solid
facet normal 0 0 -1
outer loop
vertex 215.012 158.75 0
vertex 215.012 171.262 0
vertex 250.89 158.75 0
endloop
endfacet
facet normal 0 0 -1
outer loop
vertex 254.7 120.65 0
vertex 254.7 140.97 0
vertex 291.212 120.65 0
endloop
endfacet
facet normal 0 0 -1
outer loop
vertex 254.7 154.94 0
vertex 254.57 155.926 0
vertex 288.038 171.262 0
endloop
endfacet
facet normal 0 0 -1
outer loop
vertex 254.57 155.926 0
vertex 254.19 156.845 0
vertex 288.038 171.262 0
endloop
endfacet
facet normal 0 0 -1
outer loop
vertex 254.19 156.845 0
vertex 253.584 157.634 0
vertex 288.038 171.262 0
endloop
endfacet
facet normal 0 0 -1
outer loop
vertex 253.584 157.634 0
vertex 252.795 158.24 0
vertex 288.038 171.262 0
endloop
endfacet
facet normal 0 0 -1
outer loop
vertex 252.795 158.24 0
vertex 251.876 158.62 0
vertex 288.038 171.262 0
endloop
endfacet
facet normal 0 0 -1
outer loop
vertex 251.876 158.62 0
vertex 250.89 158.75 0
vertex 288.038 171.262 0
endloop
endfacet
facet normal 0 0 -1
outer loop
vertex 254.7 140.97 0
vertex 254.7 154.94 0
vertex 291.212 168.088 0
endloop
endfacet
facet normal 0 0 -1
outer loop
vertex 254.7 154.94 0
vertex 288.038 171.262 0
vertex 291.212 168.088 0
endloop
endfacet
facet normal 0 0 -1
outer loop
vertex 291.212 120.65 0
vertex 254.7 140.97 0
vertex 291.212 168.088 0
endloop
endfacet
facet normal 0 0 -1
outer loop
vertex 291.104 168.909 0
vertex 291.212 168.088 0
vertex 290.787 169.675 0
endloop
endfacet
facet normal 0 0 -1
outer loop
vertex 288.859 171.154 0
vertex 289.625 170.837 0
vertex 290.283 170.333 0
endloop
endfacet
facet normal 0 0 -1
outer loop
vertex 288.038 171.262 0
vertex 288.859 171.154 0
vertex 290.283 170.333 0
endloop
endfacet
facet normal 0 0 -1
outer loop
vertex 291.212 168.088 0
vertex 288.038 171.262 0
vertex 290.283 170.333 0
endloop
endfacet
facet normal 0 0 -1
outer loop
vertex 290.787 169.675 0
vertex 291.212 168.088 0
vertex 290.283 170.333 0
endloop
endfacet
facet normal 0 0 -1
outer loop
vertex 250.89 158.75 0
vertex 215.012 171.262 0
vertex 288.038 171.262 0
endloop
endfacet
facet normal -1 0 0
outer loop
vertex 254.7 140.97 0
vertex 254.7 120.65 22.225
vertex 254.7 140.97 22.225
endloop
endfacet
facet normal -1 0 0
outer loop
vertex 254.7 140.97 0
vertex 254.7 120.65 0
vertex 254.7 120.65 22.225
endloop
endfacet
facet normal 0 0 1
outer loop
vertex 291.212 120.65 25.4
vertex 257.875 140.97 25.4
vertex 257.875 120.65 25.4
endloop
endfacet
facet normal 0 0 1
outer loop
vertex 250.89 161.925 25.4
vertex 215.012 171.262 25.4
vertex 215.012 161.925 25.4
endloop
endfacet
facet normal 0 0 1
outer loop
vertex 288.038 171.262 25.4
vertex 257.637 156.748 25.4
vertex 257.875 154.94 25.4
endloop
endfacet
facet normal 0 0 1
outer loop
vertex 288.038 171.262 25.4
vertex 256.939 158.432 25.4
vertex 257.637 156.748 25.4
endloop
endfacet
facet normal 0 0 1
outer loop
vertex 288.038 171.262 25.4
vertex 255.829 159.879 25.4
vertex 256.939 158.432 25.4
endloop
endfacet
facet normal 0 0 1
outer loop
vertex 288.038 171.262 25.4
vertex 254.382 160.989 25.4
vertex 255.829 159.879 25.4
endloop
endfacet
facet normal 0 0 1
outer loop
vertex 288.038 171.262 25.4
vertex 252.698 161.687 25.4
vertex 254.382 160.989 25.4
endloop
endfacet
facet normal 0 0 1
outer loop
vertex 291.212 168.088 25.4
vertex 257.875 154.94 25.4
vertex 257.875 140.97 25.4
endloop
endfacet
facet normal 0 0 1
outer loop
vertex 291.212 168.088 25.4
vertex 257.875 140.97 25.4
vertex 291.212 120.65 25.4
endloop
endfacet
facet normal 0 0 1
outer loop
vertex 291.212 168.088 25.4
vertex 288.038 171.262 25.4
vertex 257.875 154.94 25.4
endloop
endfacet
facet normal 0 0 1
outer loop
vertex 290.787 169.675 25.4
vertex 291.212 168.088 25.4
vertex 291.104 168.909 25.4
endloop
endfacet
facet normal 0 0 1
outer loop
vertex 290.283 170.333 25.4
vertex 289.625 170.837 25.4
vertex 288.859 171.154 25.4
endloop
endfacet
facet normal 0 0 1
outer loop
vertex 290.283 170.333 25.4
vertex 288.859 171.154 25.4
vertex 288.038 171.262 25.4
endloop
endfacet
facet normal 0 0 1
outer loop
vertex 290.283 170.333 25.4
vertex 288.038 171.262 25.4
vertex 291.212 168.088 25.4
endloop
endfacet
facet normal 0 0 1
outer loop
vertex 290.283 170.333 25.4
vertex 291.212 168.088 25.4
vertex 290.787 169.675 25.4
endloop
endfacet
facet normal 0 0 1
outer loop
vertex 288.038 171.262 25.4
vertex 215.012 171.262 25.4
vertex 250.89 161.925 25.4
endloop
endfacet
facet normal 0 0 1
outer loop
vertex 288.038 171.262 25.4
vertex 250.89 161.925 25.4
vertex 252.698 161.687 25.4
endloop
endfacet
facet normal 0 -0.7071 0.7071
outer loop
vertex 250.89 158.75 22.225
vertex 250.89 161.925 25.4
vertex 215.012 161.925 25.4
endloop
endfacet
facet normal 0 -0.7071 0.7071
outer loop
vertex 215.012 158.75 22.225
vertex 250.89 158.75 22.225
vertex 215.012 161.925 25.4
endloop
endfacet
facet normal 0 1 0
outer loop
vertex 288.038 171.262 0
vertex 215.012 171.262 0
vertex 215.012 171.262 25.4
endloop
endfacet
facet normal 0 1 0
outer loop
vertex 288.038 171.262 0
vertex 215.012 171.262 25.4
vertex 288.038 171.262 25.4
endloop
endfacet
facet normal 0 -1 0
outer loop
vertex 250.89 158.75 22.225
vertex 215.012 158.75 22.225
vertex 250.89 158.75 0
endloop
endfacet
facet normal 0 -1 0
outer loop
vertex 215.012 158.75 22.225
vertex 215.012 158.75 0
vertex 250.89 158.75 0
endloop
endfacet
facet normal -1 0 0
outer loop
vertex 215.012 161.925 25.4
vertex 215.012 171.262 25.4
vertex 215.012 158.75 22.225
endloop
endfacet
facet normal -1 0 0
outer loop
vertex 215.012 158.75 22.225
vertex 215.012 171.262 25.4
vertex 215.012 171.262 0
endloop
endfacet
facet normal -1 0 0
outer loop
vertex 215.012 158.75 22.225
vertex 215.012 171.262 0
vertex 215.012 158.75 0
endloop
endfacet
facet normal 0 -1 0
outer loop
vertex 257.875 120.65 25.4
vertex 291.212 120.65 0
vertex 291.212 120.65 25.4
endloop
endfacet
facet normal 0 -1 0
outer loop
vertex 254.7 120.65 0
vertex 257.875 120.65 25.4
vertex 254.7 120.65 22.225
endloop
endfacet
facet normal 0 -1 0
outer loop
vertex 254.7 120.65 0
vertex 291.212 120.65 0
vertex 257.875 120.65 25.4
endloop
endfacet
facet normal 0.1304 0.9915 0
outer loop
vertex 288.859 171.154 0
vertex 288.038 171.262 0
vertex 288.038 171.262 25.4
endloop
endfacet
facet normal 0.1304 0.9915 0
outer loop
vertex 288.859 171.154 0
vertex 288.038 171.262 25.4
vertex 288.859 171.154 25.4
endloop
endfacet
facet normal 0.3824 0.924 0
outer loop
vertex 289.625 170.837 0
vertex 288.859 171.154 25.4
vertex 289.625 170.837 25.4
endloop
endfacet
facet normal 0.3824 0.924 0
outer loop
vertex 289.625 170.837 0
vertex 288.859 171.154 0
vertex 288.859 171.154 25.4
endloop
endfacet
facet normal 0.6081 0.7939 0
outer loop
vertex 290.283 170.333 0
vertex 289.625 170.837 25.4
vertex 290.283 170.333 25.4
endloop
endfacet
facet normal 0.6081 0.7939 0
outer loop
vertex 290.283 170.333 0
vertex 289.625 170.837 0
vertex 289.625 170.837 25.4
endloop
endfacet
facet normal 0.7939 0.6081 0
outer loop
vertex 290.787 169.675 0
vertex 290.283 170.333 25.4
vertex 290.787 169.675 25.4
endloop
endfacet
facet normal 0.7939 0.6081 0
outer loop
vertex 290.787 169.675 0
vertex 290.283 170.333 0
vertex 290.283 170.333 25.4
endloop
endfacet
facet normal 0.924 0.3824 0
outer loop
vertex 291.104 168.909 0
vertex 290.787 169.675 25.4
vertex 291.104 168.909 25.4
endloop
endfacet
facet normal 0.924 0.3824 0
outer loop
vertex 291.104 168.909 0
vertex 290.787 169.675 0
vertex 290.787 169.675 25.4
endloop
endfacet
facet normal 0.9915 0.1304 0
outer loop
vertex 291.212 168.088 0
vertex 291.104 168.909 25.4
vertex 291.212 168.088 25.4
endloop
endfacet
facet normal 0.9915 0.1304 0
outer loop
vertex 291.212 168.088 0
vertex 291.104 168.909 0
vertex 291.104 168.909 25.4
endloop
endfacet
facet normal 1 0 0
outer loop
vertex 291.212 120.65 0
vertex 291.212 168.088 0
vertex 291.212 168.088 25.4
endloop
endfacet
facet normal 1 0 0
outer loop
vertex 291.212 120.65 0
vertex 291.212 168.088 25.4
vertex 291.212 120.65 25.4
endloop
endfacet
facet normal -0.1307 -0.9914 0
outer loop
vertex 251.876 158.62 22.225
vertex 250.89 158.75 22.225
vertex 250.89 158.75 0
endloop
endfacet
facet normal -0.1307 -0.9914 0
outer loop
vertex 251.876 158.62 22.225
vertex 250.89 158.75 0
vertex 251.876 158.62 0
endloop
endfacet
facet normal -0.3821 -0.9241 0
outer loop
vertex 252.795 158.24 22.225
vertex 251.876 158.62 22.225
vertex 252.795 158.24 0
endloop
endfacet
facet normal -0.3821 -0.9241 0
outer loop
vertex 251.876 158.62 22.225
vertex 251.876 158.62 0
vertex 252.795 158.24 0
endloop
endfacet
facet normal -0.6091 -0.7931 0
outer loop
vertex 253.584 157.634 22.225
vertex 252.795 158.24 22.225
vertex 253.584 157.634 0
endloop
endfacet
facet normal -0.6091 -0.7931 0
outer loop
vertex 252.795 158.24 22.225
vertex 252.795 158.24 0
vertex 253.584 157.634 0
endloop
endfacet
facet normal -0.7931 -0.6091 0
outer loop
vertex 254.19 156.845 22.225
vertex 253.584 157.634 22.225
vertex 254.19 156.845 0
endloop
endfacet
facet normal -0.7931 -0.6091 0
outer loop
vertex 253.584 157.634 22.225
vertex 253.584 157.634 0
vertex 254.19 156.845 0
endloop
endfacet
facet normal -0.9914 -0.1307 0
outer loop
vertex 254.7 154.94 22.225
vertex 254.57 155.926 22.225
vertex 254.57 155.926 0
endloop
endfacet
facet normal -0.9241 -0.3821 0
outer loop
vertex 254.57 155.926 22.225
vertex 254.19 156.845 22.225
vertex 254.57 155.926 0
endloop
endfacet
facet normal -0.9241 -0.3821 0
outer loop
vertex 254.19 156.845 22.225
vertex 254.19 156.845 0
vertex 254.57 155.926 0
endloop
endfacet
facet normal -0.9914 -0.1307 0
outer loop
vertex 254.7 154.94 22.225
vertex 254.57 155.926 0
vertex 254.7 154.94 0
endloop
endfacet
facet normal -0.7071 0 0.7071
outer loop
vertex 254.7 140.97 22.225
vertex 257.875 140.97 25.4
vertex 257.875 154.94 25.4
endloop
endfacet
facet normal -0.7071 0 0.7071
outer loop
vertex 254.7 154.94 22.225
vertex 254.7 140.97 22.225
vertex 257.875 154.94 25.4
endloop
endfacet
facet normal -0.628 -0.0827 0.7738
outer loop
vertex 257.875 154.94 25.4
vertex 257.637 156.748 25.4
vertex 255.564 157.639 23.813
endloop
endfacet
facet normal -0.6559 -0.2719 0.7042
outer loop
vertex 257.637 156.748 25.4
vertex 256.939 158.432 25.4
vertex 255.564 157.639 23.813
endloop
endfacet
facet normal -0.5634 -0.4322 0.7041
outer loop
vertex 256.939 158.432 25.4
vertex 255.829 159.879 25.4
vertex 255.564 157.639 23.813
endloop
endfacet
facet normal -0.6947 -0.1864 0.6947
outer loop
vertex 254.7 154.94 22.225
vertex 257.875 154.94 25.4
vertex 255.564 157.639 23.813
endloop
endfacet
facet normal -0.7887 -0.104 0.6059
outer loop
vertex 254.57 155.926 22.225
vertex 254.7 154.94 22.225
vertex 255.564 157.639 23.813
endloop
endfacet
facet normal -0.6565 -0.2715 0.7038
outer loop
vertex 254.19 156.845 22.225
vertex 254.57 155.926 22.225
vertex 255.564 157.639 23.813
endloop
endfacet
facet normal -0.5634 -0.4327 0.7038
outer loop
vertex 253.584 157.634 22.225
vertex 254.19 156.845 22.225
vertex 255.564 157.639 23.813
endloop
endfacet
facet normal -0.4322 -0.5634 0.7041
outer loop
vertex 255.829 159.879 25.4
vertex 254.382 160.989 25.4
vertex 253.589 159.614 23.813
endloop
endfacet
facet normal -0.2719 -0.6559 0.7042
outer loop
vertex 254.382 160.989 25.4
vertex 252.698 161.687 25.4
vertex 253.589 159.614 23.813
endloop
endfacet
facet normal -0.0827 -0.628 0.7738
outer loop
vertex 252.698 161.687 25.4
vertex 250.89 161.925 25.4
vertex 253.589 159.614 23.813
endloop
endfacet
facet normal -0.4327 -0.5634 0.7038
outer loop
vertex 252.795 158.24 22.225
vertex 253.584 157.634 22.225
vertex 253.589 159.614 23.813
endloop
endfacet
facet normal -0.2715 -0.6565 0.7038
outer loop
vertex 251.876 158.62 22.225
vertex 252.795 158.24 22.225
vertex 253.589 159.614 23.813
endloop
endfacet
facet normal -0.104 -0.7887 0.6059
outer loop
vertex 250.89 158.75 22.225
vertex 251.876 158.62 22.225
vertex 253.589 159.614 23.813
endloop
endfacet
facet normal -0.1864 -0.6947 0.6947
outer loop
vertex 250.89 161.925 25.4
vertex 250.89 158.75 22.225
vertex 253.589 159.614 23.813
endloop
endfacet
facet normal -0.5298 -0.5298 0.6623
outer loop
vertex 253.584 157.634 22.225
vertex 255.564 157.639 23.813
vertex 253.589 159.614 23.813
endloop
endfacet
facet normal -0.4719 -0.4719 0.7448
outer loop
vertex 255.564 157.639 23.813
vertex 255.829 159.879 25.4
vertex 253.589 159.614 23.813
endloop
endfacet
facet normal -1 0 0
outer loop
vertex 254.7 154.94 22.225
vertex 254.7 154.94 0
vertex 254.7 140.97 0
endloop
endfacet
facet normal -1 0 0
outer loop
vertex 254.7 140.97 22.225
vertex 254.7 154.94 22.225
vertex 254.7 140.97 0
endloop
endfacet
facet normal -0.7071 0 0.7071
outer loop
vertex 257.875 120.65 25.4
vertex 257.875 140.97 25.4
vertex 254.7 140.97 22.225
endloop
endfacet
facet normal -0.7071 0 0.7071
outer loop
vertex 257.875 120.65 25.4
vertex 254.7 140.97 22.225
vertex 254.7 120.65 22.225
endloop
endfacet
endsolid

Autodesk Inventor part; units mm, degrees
ref_plane "YZ Plane" through (0, 0, 0) normal (1, 0, 0) x (0, 1, 0)
ref_plane "XZ Plane" through (0, 0, 0) normal (0, 1, 0) x (-1, 0, 0)
ref_plane "XY Plane" through (0, 0, 0) normal (0, 0, 1) x (1, 0, 0)
ref_plane "Work Plane1" through (0, 0, 0) normal (0, 0, 1) x (1, 0, 0)
sketch "Sketch1" plane through (0, 0, 0) normal (0, 0, 1) x (1, 0, 0)
  line L0 (254.7, 154.94) -> (254.7, 140.97) projected
  line L1 (254.7, -154.94) -> (254.7, 140.97) projected
  arc A0 (254.7, 154.94) -> (250.89, 158.75) centre (250.89, 154.94) ccw projected
  line L2 (-274.89, 158.75) -> (250.89, 158.75) projected
  arc A1 (260.25, -24.13) -> (261.52, -25.4) centre (261.52, -24.13) ccw projected
  line L3 (260.25, -24.13) -> (260.25, -21.59) projected
  arc A2 (261.52, -20.32) -> (260.25, -21.59) centre (261.52, -21.59) ccw projected
  line L4 (261.52, -20.32) -> (265.66, -20.32) projected
  arc A3 (266.93, -21.59) -> (265.66, -20.32) centre (265.66, -21.59) ccw projected
  line L5 (266.93, -21.59) -> (266.93, -24.13) projected
  arc A4 (265.66, -25.4) -> (266.93, -24.13) centre (265.66, -24.13) ccw projected
  line L6 (265.66, -25.4) -> (261.52, -25.4) projected
  arc A5 (-288.0375, 171.2625) -> (-291.2125, 168.0875) centre (-288.0375, 168.0875) ccw projected
  line L7 (-291.2125, -168.0875) -> (-291.2125, 168.0875) projected
  arc A6 (-291.2125, -168.0875) -> (-288.0375, -171.2625) centre (-288.0375, -168.0875) ccw projected
  line L8 (288.0375, -171.2625) -> (-288.0375, -171.2625) projected
  arc A7 (288.0375, -171.2625) -> (291.2125, -168.0875) centre (288.0375, -168.0875) ccw projected
  line L9 (291.2125, 168.0875) -> (291.2125, -168.0875) projected
  arc A8 (291.2125, 168.0875) -> (288.0375, 171.2625) centre (288.0375, 168.0875) ccw projected
  line L10 (-288.0375, 171.2625) -> (288.0375, 171.2625) projected
  circle A9 centre (264.3, 19.25) radius 3.6 projected
  line L11 (295.2621, 171.2883) -> (295.2621, 171.2625)
  line L12 (291.2125, 120.65) -> (254.7, 120.65)
  line L13 (215.0125, 171.2625) -> (215.0125, 158.75)
  point P0 (0, 0)
extrude "Extrusion1" add sketch "Sketch1" along normal blind 25.4 contours A0 L2 L13 L10 A8 L9 L12 L1 L0
chamfer "Chamfer1" distance 3.175 angle 45 3 edges at (254.7, 130.81, 25.4) (253.5841, 157.6341, 25.4) (232.9512, 158.75, 25.4)
properties material "ABS Plastic"
